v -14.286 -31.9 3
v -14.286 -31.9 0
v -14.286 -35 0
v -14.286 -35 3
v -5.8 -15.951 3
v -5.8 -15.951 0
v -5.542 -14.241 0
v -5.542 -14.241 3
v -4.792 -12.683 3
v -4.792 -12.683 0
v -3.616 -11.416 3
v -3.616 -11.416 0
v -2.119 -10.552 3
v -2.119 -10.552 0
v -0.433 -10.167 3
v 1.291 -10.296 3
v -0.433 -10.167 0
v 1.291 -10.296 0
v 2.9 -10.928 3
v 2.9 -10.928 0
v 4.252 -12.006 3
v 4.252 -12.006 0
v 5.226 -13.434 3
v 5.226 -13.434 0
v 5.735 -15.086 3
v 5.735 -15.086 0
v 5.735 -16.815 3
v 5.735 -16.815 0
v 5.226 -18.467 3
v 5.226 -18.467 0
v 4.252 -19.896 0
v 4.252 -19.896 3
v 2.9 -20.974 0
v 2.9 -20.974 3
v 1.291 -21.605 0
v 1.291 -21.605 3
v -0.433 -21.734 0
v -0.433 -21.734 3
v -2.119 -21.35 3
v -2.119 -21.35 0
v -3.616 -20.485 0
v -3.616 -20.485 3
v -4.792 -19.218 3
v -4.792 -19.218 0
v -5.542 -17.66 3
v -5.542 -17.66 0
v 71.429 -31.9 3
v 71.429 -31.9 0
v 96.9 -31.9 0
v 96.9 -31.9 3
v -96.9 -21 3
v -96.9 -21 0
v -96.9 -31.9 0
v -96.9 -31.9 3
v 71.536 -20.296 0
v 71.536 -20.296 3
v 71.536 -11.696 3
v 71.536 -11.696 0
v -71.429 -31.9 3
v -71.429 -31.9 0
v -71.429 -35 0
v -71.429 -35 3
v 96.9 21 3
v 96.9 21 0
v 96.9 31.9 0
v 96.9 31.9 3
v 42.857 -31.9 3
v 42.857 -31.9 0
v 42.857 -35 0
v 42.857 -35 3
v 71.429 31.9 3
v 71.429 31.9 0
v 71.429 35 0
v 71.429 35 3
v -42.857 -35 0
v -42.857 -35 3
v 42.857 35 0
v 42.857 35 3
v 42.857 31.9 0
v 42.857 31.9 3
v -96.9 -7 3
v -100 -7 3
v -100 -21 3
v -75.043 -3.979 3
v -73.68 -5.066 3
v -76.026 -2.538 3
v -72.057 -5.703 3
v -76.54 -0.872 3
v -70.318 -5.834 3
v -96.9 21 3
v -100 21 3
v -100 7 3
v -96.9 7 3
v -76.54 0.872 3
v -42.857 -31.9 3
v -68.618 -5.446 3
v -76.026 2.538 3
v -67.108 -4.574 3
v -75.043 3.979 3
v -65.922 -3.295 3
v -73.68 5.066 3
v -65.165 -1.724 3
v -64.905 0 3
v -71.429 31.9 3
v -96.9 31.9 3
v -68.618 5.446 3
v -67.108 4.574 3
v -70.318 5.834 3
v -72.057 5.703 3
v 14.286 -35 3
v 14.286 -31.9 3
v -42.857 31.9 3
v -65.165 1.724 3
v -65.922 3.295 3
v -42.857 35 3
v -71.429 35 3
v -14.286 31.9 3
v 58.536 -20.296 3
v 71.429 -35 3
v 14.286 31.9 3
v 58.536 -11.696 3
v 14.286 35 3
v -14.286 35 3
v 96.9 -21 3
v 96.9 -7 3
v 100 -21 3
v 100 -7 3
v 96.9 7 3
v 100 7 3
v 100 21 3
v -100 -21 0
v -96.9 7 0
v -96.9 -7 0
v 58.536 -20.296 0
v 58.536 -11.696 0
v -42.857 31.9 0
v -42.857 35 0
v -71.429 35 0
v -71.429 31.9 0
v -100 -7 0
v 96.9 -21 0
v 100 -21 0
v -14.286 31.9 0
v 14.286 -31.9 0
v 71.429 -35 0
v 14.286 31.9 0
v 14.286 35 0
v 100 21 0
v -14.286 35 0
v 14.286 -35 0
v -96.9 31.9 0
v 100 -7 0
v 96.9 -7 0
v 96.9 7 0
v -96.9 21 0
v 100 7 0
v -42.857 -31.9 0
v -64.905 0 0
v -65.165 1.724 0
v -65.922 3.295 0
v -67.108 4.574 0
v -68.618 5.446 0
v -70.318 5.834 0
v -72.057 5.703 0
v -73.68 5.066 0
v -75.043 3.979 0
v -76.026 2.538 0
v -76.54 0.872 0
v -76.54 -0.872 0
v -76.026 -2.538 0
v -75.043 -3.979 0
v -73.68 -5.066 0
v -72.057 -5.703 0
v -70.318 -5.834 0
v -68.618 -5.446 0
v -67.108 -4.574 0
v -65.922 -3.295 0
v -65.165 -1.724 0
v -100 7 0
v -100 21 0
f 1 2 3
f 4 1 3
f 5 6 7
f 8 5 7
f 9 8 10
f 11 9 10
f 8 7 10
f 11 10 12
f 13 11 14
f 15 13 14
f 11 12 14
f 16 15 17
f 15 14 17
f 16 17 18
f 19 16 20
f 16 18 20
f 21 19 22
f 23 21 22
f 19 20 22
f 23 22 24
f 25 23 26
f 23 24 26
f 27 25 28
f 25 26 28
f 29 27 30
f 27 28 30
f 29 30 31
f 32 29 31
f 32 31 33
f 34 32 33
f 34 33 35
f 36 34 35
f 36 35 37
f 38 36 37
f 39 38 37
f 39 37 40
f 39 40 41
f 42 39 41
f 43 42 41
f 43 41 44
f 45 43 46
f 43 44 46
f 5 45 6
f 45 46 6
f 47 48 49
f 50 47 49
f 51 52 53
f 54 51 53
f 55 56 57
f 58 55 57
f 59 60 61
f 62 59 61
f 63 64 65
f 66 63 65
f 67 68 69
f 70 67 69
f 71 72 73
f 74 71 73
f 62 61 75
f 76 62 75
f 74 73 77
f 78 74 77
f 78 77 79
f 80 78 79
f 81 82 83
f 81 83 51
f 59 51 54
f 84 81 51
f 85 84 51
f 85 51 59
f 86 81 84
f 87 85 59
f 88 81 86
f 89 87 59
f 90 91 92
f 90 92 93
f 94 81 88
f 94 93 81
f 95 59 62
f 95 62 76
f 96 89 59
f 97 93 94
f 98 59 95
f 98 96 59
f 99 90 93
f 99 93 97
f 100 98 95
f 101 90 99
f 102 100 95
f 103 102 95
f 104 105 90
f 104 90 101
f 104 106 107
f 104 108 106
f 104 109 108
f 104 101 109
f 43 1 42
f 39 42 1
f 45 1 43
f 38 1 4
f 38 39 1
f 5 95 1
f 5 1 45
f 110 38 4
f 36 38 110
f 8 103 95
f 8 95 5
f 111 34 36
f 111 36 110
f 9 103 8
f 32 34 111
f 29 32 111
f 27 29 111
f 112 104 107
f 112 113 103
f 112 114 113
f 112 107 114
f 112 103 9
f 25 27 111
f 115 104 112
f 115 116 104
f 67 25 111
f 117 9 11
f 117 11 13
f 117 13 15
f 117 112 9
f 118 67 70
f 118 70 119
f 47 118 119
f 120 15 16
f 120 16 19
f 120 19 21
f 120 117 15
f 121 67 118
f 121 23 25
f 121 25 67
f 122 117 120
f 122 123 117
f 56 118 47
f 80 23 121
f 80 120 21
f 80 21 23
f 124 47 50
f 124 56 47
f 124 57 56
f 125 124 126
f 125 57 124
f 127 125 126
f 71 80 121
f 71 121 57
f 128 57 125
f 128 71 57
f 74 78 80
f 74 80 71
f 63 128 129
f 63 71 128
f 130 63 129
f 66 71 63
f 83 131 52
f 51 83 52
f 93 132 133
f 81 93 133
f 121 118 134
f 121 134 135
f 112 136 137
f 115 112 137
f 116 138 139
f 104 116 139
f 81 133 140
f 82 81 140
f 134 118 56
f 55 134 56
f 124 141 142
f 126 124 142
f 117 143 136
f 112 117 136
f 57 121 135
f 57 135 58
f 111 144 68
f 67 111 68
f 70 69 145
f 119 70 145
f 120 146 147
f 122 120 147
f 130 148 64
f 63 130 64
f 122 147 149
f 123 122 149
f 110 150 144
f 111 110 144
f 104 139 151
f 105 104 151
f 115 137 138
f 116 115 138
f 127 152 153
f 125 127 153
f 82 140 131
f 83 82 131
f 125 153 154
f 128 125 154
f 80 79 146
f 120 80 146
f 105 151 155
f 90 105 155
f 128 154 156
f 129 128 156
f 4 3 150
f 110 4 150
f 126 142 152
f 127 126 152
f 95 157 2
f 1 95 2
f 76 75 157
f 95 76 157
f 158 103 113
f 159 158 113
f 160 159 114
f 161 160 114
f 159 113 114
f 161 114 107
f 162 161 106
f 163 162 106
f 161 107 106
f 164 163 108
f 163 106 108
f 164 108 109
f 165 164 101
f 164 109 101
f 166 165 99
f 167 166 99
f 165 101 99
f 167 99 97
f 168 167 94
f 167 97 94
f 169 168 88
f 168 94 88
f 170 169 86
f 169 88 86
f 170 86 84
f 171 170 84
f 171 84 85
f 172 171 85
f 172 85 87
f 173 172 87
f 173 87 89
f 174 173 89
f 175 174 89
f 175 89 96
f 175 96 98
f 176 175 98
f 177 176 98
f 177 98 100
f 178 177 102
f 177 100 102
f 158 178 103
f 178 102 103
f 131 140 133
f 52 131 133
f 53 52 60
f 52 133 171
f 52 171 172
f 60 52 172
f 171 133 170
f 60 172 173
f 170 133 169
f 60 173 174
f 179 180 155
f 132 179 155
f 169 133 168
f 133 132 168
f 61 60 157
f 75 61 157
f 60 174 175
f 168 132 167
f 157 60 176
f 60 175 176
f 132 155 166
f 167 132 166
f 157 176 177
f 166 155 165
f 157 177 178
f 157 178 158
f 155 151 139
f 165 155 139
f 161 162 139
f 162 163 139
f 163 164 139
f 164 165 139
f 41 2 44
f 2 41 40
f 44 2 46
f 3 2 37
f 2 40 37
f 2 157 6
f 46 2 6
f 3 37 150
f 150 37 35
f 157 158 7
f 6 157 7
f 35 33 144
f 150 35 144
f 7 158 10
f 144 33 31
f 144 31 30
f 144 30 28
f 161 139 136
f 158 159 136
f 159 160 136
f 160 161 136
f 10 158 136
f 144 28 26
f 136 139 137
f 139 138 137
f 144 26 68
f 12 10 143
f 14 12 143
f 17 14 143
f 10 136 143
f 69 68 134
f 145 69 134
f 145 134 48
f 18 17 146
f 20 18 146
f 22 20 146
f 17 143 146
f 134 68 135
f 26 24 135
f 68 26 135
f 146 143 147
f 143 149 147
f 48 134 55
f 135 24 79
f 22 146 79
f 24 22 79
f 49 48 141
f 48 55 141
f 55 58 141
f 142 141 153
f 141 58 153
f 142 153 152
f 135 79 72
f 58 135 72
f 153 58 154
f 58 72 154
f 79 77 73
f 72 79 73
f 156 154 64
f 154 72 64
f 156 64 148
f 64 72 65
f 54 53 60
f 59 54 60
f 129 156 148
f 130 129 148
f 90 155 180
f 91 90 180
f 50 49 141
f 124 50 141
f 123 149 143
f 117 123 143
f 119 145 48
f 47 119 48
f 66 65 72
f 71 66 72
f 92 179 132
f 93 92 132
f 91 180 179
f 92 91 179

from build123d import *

# Parameters (mm, degrees)
SALIENTE_EXTRUIR2_DEPTH = 3
CROQUIS3_R              = 5.85
CORTAR_EXTRUIR1_DEPTH   = 3
CROQUIS4_W              = 13
CROQUIS4_H              = 8.6
CORTAR_EXTRUIR2_DEPTH   = 3
CROQUIS5_R              = 5.8
CORTAR_EXTRUIR3_DEPTH   = 3


with BuildPart() as part:
    # Croquis1 → Saliente-Extruir2 (new body)
    with BuildSketch(Plane.XY):
        Polygon((-71.428571429, -31.9), (-71.428571429, -35), (-42.857142857, -35), (-42.857142857, -31.9), (-14.285714286, -31.9), (-14.285714286, -35), (14.285714286, -35), (14.285714286, -31.9), (42.857142857, -31.9), (42.857142857, -35), (71.428571429, -35), (71.428571429, -31.9), (96.9, -31.9), (96.9, -21), (100, -21), (100, -7), (96.9, -7), (96.9, 7), (100, 7), (100, 21), (96.9, 21), (96.9, 31.9), (71.428571429, 31.9), (71.428571429, 35), (42.857142857, 35), (42.857142857, 31.9), (14.285714286, 31.9), (14.285714286, 35), (-14.285714286, 35), (-14.285714286, 31.9), (-42.857142857, 31.9), (-42.857142857, 35), (-71.428571429, 35), (-71.428571429, 31.9), (-96.9, 31.9), (-96.9, 21), (-100, 21), (-100, 7), (-96.9, 7), (-96.9, -7), (-100, -7), (-100, -21), (-96.9, -21), (-96.9, -31.9), align=None)
    extrude(amount=SALIENTE_EXTRUIR2_DEPTH)

    # Croquis3 → Cortar-Extruir1 (cut)
    with BuildSketch(Plane.XY.offset(3)):
        with Locations((-70.755124627, 0)):
            Circle(CROQUIS3_R)
    extrude(amount=-CORTAR_EXTRUIR1_DEPTH, mode=Mode.SUBTRACT)

    # Croquis4 → Cortar-Extruir2 (cut)
    with BuildSketch(Plane.XY.offset(3)):
        with Locations((65.03625281, -15.995927208)):
            Rectangle(CROQUIS4_W, CROQUIS4_H)
    extrude(amount=-CORTAR_EXTRUIR2_DEPTH, mode=Mode.SUBTRACT)

    # Croquis5 → Cortar-Extruir3 (cut)
    with BuildSketch(Plane(origin=(0, 0, 0), x_dir=(-1, 0, 0), z_dir=(0, 0, -1))):
        with Locations((0, -15.950666175)):
            Circle(CROQUIS5_R)
    extrude(amount=-CORTAR_EXTRUIR3_DEPTH, mode=Mode.SUBTRACT)


solid = part.part
